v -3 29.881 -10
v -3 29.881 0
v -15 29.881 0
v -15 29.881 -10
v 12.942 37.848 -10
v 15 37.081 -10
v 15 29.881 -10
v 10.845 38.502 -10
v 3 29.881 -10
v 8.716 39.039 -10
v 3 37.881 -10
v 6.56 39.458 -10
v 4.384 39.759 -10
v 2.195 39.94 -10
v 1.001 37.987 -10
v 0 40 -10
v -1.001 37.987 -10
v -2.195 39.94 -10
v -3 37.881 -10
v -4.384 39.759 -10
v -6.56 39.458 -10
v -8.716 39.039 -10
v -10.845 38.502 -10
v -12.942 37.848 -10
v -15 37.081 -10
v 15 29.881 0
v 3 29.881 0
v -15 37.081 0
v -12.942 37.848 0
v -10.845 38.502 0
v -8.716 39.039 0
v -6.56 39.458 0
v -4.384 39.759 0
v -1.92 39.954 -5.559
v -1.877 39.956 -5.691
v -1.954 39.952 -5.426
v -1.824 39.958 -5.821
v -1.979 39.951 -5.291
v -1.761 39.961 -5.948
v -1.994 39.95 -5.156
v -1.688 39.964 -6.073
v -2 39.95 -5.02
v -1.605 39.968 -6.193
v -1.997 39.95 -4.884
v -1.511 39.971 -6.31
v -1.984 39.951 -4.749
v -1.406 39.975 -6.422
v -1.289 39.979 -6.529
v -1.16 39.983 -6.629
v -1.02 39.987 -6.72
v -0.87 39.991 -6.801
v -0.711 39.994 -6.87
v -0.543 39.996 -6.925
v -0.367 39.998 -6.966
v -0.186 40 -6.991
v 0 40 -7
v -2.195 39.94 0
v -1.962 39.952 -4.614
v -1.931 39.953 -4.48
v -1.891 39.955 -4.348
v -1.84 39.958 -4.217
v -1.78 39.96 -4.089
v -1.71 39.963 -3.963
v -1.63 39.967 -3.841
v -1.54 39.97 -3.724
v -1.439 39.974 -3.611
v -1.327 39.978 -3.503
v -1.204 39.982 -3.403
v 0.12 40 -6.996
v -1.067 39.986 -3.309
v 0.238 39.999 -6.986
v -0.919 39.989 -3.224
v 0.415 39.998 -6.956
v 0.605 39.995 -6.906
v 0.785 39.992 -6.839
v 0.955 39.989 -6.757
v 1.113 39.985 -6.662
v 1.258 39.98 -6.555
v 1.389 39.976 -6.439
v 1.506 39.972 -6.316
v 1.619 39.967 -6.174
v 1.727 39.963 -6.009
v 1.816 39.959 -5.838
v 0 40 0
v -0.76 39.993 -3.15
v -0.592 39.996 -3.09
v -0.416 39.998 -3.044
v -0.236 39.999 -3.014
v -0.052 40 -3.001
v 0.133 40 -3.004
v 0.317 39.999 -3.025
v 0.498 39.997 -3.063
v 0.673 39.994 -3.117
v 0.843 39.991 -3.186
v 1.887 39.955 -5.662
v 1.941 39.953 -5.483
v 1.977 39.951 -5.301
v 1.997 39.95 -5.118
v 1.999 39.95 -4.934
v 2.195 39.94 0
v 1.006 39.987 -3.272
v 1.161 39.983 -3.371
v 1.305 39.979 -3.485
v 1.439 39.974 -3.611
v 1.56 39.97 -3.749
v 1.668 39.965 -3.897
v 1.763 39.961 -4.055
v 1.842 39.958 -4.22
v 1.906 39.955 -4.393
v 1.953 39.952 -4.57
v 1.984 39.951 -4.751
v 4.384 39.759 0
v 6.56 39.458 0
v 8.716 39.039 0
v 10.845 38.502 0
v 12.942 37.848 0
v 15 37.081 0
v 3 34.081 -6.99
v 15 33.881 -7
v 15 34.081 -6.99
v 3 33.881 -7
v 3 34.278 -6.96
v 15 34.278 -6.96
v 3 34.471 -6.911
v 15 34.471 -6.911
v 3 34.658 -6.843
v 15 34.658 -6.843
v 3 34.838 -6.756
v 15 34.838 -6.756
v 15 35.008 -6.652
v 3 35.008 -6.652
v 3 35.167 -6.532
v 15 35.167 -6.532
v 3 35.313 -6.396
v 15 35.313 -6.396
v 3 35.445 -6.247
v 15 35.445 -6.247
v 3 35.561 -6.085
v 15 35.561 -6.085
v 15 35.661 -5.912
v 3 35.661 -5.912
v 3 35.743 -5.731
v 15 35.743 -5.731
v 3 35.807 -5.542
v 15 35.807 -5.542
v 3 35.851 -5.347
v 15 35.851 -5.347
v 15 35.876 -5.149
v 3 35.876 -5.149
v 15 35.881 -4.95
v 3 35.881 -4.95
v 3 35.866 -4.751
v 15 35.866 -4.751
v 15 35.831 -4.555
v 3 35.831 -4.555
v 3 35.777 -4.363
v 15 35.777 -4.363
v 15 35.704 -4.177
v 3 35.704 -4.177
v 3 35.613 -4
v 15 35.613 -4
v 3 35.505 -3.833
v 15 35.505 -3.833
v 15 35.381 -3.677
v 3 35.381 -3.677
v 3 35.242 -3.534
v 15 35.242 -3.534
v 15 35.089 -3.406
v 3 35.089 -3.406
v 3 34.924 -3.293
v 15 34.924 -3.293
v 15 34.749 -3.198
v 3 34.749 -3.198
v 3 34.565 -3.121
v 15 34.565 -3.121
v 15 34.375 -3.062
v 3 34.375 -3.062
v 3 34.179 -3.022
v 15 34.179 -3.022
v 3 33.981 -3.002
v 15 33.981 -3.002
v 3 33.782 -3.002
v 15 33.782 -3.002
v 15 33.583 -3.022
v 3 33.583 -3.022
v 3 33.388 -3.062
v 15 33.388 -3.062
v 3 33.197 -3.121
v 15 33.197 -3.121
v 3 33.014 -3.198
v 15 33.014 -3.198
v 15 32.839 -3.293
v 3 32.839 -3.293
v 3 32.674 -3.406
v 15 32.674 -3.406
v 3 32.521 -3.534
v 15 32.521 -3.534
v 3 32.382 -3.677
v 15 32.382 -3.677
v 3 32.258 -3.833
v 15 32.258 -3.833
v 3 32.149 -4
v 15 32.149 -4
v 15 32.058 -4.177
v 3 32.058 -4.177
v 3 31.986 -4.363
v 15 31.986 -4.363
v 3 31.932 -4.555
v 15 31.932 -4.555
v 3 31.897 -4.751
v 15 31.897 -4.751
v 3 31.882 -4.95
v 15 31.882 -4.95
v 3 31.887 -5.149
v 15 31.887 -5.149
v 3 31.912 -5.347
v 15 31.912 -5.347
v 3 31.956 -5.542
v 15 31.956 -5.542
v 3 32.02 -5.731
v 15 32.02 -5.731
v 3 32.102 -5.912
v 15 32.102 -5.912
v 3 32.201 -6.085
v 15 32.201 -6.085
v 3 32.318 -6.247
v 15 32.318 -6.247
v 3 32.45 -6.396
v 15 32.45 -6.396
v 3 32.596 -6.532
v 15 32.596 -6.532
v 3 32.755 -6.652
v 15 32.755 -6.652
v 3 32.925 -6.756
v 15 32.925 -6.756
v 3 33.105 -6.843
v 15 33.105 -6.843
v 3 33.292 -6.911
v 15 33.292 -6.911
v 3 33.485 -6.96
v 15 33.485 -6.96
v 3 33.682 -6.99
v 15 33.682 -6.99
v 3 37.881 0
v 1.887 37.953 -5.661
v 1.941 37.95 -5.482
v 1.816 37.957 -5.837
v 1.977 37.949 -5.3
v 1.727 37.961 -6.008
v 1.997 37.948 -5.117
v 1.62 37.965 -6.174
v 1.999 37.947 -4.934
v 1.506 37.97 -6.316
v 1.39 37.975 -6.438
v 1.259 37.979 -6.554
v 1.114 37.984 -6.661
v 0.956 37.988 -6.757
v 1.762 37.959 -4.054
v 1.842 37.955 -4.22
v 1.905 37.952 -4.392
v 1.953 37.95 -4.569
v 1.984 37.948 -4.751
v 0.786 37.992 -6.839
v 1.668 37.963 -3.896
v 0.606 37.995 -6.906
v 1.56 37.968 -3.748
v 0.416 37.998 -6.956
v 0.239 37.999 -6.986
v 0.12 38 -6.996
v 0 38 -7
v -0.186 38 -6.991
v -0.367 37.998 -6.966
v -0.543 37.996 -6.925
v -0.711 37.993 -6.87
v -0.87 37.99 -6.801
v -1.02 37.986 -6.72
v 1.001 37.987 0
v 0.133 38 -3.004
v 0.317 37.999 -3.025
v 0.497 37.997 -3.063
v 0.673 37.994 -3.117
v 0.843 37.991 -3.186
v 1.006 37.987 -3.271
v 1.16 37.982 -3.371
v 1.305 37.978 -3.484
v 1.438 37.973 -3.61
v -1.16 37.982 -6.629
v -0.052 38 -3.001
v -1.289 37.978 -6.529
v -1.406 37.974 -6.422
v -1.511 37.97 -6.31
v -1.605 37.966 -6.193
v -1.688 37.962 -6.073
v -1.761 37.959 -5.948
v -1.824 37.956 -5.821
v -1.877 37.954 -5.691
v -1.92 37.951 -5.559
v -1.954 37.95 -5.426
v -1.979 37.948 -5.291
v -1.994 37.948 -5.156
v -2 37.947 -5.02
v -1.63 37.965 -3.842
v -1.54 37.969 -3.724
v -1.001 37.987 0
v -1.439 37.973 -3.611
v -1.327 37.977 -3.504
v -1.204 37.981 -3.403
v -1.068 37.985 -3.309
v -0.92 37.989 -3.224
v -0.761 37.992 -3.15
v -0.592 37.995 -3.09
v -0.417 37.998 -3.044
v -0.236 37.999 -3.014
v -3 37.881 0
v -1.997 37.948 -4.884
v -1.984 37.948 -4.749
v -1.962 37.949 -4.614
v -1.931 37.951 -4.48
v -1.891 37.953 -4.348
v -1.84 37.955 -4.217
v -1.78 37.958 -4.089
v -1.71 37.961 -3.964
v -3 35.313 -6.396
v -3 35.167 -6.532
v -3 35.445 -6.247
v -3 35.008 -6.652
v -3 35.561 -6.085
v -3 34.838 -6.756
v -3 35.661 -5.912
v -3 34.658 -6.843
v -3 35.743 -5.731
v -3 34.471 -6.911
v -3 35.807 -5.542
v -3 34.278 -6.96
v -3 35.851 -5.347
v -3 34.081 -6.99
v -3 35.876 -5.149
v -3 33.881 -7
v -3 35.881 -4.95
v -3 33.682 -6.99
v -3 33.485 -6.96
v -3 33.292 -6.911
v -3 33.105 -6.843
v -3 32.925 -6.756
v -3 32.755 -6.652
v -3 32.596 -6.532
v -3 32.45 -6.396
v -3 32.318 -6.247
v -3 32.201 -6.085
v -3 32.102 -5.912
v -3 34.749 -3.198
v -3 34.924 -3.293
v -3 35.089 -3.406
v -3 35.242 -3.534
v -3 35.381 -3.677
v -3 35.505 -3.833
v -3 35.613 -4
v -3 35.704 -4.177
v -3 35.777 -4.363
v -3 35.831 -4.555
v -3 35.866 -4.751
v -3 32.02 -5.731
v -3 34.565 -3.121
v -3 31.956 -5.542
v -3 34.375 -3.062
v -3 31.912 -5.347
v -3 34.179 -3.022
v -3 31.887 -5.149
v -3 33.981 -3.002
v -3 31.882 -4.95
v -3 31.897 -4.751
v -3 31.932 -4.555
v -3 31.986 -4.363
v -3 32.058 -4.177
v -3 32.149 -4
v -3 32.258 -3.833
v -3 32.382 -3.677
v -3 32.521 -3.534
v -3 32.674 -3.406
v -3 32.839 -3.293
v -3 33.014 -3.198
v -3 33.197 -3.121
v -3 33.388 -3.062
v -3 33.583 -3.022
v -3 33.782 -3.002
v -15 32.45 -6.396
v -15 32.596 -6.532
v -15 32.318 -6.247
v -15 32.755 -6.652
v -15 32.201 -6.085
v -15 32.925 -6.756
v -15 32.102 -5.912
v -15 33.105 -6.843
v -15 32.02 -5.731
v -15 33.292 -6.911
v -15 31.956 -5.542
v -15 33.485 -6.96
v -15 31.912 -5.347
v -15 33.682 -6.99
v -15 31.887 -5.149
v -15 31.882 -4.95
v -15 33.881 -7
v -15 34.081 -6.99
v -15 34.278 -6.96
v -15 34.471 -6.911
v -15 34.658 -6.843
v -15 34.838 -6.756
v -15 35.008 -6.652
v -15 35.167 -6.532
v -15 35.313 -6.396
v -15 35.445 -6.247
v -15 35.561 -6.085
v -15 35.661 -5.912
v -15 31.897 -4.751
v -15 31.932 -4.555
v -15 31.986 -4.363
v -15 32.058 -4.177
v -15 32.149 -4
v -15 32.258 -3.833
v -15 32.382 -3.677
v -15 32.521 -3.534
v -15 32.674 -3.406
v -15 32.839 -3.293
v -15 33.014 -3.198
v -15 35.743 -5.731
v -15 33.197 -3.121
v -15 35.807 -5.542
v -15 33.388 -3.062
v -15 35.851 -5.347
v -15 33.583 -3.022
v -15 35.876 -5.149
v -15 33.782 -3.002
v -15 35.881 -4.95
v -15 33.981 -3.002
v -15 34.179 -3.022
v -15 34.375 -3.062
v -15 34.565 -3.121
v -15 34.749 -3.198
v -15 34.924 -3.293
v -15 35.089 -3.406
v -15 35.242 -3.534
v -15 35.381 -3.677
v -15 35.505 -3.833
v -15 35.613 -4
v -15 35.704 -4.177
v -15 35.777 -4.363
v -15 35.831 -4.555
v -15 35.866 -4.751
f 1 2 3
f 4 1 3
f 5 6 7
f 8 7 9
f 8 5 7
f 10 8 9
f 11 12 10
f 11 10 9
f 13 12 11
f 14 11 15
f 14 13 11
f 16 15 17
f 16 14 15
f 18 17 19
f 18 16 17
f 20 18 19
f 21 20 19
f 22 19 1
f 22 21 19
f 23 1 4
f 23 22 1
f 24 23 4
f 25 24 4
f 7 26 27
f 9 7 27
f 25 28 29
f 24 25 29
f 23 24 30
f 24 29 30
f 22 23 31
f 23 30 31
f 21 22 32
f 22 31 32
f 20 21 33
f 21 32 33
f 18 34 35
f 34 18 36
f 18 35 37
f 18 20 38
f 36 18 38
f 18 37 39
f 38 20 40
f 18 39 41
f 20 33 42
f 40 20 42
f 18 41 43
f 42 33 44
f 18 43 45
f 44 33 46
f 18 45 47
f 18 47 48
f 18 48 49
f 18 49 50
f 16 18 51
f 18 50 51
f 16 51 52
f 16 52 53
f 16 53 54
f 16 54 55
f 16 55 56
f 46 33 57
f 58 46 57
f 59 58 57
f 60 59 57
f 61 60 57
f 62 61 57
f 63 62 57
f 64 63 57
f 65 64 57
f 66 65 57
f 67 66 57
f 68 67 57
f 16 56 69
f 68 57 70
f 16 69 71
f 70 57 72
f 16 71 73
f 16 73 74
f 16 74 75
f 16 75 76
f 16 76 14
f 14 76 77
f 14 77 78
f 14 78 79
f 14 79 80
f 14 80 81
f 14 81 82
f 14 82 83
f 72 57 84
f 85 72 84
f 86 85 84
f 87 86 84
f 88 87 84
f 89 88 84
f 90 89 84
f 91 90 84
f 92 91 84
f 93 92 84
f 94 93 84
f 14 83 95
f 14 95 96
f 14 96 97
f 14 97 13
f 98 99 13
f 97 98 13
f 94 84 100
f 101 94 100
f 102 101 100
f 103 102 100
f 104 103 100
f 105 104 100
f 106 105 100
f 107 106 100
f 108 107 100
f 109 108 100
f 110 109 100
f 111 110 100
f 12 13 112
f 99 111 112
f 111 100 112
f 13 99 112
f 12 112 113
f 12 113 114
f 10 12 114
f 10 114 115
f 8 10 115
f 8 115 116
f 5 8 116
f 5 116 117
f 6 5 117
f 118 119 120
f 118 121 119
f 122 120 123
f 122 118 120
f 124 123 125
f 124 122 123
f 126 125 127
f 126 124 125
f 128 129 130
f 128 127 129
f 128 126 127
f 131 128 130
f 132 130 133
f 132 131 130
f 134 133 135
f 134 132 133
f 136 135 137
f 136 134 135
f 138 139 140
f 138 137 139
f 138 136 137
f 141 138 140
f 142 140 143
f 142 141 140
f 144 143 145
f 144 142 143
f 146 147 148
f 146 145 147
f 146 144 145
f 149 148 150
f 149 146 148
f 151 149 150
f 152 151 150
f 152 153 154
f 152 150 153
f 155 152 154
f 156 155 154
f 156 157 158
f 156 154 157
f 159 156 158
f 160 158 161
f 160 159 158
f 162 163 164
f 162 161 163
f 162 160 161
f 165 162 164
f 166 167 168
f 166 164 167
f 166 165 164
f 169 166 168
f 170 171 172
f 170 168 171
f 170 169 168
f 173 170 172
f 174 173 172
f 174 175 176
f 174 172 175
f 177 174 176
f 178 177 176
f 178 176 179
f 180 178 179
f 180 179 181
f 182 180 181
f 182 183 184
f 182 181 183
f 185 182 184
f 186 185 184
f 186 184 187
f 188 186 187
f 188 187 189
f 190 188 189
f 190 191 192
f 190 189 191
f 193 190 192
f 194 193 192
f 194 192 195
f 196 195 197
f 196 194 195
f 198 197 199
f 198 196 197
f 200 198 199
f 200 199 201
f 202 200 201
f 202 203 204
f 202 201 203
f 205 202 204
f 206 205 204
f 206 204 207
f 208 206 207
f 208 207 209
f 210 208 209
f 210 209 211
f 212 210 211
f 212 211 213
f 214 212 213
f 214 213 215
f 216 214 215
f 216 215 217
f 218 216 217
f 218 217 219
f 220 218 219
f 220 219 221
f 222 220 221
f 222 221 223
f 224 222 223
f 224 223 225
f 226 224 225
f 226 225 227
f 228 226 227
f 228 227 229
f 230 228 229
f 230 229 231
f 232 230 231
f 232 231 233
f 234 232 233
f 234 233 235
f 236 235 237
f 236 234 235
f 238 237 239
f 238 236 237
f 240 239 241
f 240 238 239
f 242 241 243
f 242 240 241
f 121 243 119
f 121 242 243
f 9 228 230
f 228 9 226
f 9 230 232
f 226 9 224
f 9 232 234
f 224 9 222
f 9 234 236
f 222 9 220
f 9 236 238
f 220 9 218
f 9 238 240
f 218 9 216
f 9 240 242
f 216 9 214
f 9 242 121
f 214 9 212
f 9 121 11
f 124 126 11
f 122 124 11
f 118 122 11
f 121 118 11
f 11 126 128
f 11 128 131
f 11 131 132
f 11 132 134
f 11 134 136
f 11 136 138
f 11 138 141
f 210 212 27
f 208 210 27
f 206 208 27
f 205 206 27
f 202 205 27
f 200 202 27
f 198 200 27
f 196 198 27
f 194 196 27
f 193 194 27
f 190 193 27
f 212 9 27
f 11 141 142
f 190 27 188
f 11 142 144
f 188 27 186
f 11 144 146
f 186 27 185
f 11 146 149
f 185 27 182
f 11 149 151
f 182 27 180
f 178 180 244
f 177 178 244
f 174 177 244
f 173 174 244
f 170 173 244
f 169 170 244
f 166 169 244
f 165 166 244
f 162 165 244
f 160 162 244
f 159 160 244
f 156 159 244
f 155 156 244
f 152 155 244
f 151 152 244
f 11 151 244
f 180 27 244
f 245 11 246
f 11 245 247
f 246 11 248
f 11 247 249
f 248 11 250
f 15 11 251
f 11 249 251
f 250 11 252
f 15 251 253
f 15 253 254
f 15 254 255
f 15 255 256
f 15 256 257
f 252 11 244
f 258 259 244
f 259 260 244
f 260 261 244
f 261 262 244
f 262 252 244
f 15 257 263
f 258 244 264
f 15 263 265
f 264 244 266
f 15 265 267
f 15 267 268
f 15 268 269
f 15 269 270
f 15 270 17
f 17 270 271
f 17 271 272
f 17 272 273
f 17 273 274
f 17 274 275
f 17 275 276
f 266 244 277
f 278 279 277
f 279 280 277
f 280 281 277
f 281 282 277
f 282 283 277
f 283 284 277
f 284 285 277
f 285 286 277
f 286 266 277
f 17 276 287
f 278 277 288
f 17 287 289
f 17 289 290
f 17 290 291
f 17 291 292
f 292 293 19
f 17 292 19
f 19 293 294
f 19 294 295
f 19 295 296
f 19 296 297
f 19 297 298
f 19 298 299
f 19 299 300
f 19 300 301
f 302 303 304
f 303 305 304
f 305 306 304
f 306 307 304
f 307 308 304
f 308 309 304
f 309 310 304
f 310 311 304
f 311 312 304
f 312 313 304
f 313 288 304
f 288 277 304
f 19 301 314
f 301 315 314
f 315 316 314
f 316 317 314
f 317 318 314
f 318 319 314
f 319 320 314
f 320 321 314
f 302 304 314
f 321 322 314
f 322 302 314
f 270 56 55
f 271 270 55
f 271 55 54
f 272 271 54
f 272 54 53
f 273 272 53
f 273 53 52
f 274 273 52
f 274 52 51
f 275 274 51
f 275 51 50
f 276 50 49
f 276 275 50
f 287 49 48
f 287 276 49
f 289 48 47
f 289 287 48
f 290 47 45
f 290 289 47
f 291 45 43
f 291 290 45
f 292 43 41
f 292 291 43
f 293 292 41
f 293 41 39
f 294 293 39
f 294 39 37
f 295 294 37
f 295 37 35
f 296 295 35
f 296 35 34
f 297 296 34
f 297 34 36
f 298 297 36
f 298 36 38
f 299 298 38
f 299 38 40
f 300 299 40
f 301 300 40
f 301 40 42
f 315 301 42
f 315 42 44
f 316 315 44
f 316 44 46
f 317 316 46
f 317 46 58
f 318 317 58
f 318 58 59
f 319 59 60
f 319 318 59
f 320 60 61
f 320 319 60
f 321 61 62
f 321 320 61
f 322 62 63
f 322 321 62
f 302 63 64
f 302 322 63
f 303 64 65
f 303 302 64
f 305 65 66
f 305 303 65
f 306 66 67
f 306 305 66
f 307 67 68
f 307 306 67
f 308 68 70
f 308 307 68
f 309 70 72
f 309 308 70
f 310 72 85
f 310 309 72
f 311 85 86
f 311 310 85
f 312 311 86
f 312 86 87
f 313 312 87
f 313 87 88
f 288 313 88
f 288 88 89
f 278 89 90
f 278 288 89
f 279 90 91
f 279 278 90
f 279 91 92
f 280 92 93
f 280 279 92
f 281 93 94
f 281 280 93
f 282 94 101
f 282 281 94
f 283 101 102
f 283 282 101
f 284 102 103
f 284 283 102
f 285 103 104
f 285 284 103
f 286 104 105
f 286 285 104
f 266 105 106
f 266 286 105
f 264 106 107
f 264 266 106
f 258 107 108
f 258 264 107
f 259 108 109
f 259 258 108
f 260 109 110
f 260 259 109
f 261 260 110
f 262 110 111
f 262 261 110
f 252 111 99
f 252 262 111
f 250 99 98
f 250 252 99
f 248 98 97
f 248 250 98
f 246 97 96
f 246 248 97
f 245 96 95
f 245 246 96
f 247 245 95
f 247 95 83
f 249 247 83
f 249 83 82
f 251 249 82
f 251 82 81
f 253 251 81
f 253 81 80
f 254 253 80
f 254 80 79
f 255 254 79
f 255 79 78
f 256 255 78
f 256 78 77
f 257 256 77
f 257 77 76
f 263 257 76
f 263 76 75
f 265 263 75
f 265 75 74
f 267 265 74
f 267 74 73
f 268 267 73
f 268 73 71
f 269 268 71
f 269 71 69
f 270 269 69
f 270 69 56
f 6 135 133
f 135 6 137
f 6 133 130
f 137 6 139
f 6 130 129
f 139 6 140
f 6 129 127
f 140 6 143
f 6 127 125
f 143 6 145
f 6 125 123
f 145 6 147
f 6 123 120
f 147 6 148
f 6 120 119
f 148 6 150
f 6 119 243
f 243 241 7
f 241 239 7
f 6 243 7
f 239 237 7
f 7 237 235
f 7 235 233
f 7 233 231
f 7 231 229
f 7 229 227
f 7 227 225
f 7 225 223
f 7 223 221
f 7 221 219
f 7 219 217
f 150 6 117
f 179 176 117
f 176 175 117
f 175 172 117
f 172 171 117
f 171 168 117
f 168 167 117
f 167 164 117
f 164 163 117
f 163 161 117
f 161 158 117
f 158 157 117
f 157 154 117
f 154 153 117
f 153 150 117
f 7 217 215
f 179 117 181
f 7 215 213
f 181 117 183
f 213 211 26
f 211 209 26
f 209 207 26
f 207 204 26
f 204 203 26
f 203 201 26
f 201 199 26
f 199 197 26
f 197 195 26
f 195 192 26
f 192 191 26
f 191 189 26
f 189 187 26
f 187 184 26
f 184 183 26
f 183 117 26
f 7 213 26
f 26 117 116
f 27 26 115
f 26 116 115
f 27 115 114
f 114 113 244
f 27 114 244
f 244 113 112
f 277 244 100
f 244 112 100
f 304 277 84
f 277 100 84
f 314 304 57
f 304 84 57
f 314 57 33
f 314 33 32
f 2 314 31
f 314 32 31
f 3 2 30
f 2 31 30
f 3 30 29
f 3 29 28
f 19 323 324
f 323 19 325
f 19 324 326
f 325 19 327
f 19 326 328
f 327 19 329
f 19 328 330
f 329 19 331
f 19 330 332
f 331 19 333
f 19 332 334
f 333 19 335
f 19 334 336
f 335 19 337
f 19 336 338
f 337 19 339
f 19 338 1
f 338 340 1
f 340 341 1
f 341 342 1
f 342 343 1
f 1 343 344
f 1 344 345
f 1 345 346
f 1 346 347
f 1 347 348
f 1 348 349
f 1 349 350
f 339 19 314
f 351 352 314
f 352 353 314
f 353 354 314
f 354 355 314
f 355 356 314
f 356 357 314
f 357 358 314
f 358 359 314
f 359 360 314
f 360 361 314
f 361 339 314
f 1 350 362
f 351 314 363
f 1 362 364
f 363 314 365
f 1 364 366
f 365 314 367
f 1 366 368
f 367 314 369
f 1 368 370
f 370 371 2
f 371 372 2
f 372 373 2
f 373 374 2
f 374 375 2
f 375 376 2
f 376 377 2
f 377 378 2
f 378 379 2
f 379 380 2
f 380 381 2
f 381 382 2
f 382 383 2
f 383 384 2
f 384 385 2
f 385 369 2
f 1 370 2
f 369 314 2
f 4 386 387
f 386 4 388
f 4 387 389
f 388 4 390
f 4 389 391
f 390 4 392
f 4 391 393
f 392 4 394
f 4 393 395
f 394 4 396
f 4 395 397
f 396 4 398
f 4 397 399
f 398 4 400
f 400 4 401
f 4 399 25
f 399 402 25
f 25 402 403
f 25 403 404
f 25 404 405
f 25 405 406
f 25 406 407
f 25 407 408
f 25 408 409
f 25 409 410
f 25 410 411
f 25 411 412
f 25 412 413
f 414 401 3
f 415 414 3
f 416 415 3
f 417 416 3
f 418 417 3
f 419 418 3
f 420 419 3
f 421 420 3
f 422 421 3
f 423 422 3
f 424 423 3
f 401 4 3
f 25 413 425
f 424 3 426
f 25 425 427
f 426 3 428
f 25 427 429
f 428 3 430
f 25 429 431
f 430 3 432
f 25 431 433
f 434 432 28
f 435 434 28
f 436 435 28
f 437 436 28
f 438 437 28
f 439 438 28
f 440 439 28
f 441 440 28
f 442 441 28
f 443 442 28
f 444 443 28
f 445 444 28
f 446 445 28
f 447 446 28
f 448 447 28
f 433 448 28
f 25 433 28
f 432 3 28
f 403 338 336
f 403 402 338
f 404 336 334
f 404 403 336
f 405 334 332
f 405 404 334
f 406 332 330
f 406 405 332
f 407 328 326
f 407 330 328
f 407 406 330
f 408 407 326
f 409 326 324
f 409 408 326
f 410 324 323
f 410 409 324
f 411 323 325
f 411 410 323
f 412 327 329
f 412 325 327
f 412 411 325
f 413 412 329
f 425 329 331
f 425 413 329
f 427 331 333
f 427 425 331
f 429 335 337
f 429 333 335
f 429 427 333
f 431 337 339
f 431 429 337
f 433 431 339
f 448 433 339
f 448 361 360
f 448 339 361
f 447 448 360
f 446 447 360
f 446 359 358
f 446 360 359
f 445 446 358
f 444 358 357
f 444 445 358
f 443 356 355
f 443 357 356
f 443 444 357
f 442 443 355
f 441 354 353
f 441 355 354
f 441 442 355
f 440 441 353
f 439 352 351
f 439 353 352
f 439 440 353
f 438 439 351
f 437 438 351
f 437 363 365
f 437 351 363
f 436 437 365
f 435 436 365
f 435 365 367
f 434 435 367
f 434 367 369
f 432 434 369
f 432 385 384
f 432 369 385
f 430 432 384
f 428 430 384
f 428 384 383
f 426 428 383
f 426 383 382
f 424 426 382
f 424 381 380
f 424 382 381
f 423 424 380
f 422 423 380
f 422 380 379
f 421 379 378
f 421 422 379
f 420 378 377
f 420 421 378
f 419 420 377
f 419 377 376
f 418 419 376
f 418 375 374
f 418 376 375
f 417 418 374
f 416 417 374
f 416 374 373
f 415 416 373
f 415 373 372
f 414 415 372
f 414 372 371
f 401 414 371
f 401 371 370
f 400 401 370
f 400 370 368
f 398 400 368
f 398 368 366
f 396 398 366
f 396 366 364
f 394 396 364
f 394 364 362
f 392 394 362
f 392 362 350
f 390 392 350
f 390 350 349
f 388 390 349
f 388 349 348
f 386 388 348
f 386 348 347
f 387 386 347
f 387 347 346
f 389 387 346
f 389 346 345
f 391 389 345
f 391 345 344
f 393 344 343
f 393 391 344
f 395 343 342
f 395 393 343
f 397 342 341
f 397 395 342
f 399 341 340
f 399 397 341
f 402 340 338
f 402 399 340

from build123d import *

# Parameters (mm, degrees)
BOSS_EXTRUDE1_DEPTH     = 10
CUT_EXTRUDE2_DEPTH      = 45.988887517
CUT_EXTRUDE2_DEPTH_BACK = 45.988887517
SKETCH5_R               = 2
CUT_EXTRUDE3_DEPTH      = 44.874821937


with BuildPart() as part:
    # Sketch1 → Boss-Extrude1 (new body)
    with BuildSketch(Plane.XY):
        with BuildLine():
            ThreePointArc((-15, 37.080992435), (0, 40), (15, 37.080992435))
            Line((15, 37.080992435), (15, 29.88139385))
            Line((15, 29.88139385), (3, 29.88139385))
            Line((3, 29.88139385), (3, 37.88139385))
            ThreePointArc((3, 37.88139385), (0, 38), (-3, 37.88139385))
            Line((-3, 37.88139385), (-3, 29.88139385))
            Line((-3, 29.88139385), (-15, 29.88139385))
            Line((-15, 29.88139385), (-15, 37.080992435))
        make_face()
    extrude(amount=-BOSS_EXTRUDE1_DEPTH)

    # Sketch4 → Cut-Extrude2 (cut, two sides: drawn at the far end of the back side and taken through both)
    with BuildSketch(Plane(origin=(-3, 0, 0), x_dir=(0, 0, -1), z_dir=(1, 0, 0)).offset(-CUT_EXTRUDE2_DEPTH_BACK)):
        with BuildLine():
            ThreePointArc((3, 33.88139385), (5, 31.88139385), (7, 33.88139385))
            Line((7, 33.88139385), (3, 33.88139385))
        make_face()
        with BuildLine():
            Line((3, 33.88139385), (7, 33.88139385))
            ThreePointArc((7, 33.88139385), (5, 35.88139385), (3, 33.88139385))
        make_face()
    extrude(amount=CUT_EXTRUDE2_DEPTH + CUT_EXTRUDE2_DEPTH_BACK, mode=Mode.SUBTRACT)

    # Sketch5 → Cut-Extrude3 (cut, through all)
    with BuildSketch(Plane(origin=(0, 0, 0), x_dir=(1, 0, 0), z_dir=(0, 1, 0))):
        with Locations(Location((0, 5, 0), (0, 0, 90))):
            Circle(SKETCH5_R)
    extrude(amount=CUT_EXTRUDE3_DEPTH, mode=Mode.SUBTRACT)


solid = part.part
